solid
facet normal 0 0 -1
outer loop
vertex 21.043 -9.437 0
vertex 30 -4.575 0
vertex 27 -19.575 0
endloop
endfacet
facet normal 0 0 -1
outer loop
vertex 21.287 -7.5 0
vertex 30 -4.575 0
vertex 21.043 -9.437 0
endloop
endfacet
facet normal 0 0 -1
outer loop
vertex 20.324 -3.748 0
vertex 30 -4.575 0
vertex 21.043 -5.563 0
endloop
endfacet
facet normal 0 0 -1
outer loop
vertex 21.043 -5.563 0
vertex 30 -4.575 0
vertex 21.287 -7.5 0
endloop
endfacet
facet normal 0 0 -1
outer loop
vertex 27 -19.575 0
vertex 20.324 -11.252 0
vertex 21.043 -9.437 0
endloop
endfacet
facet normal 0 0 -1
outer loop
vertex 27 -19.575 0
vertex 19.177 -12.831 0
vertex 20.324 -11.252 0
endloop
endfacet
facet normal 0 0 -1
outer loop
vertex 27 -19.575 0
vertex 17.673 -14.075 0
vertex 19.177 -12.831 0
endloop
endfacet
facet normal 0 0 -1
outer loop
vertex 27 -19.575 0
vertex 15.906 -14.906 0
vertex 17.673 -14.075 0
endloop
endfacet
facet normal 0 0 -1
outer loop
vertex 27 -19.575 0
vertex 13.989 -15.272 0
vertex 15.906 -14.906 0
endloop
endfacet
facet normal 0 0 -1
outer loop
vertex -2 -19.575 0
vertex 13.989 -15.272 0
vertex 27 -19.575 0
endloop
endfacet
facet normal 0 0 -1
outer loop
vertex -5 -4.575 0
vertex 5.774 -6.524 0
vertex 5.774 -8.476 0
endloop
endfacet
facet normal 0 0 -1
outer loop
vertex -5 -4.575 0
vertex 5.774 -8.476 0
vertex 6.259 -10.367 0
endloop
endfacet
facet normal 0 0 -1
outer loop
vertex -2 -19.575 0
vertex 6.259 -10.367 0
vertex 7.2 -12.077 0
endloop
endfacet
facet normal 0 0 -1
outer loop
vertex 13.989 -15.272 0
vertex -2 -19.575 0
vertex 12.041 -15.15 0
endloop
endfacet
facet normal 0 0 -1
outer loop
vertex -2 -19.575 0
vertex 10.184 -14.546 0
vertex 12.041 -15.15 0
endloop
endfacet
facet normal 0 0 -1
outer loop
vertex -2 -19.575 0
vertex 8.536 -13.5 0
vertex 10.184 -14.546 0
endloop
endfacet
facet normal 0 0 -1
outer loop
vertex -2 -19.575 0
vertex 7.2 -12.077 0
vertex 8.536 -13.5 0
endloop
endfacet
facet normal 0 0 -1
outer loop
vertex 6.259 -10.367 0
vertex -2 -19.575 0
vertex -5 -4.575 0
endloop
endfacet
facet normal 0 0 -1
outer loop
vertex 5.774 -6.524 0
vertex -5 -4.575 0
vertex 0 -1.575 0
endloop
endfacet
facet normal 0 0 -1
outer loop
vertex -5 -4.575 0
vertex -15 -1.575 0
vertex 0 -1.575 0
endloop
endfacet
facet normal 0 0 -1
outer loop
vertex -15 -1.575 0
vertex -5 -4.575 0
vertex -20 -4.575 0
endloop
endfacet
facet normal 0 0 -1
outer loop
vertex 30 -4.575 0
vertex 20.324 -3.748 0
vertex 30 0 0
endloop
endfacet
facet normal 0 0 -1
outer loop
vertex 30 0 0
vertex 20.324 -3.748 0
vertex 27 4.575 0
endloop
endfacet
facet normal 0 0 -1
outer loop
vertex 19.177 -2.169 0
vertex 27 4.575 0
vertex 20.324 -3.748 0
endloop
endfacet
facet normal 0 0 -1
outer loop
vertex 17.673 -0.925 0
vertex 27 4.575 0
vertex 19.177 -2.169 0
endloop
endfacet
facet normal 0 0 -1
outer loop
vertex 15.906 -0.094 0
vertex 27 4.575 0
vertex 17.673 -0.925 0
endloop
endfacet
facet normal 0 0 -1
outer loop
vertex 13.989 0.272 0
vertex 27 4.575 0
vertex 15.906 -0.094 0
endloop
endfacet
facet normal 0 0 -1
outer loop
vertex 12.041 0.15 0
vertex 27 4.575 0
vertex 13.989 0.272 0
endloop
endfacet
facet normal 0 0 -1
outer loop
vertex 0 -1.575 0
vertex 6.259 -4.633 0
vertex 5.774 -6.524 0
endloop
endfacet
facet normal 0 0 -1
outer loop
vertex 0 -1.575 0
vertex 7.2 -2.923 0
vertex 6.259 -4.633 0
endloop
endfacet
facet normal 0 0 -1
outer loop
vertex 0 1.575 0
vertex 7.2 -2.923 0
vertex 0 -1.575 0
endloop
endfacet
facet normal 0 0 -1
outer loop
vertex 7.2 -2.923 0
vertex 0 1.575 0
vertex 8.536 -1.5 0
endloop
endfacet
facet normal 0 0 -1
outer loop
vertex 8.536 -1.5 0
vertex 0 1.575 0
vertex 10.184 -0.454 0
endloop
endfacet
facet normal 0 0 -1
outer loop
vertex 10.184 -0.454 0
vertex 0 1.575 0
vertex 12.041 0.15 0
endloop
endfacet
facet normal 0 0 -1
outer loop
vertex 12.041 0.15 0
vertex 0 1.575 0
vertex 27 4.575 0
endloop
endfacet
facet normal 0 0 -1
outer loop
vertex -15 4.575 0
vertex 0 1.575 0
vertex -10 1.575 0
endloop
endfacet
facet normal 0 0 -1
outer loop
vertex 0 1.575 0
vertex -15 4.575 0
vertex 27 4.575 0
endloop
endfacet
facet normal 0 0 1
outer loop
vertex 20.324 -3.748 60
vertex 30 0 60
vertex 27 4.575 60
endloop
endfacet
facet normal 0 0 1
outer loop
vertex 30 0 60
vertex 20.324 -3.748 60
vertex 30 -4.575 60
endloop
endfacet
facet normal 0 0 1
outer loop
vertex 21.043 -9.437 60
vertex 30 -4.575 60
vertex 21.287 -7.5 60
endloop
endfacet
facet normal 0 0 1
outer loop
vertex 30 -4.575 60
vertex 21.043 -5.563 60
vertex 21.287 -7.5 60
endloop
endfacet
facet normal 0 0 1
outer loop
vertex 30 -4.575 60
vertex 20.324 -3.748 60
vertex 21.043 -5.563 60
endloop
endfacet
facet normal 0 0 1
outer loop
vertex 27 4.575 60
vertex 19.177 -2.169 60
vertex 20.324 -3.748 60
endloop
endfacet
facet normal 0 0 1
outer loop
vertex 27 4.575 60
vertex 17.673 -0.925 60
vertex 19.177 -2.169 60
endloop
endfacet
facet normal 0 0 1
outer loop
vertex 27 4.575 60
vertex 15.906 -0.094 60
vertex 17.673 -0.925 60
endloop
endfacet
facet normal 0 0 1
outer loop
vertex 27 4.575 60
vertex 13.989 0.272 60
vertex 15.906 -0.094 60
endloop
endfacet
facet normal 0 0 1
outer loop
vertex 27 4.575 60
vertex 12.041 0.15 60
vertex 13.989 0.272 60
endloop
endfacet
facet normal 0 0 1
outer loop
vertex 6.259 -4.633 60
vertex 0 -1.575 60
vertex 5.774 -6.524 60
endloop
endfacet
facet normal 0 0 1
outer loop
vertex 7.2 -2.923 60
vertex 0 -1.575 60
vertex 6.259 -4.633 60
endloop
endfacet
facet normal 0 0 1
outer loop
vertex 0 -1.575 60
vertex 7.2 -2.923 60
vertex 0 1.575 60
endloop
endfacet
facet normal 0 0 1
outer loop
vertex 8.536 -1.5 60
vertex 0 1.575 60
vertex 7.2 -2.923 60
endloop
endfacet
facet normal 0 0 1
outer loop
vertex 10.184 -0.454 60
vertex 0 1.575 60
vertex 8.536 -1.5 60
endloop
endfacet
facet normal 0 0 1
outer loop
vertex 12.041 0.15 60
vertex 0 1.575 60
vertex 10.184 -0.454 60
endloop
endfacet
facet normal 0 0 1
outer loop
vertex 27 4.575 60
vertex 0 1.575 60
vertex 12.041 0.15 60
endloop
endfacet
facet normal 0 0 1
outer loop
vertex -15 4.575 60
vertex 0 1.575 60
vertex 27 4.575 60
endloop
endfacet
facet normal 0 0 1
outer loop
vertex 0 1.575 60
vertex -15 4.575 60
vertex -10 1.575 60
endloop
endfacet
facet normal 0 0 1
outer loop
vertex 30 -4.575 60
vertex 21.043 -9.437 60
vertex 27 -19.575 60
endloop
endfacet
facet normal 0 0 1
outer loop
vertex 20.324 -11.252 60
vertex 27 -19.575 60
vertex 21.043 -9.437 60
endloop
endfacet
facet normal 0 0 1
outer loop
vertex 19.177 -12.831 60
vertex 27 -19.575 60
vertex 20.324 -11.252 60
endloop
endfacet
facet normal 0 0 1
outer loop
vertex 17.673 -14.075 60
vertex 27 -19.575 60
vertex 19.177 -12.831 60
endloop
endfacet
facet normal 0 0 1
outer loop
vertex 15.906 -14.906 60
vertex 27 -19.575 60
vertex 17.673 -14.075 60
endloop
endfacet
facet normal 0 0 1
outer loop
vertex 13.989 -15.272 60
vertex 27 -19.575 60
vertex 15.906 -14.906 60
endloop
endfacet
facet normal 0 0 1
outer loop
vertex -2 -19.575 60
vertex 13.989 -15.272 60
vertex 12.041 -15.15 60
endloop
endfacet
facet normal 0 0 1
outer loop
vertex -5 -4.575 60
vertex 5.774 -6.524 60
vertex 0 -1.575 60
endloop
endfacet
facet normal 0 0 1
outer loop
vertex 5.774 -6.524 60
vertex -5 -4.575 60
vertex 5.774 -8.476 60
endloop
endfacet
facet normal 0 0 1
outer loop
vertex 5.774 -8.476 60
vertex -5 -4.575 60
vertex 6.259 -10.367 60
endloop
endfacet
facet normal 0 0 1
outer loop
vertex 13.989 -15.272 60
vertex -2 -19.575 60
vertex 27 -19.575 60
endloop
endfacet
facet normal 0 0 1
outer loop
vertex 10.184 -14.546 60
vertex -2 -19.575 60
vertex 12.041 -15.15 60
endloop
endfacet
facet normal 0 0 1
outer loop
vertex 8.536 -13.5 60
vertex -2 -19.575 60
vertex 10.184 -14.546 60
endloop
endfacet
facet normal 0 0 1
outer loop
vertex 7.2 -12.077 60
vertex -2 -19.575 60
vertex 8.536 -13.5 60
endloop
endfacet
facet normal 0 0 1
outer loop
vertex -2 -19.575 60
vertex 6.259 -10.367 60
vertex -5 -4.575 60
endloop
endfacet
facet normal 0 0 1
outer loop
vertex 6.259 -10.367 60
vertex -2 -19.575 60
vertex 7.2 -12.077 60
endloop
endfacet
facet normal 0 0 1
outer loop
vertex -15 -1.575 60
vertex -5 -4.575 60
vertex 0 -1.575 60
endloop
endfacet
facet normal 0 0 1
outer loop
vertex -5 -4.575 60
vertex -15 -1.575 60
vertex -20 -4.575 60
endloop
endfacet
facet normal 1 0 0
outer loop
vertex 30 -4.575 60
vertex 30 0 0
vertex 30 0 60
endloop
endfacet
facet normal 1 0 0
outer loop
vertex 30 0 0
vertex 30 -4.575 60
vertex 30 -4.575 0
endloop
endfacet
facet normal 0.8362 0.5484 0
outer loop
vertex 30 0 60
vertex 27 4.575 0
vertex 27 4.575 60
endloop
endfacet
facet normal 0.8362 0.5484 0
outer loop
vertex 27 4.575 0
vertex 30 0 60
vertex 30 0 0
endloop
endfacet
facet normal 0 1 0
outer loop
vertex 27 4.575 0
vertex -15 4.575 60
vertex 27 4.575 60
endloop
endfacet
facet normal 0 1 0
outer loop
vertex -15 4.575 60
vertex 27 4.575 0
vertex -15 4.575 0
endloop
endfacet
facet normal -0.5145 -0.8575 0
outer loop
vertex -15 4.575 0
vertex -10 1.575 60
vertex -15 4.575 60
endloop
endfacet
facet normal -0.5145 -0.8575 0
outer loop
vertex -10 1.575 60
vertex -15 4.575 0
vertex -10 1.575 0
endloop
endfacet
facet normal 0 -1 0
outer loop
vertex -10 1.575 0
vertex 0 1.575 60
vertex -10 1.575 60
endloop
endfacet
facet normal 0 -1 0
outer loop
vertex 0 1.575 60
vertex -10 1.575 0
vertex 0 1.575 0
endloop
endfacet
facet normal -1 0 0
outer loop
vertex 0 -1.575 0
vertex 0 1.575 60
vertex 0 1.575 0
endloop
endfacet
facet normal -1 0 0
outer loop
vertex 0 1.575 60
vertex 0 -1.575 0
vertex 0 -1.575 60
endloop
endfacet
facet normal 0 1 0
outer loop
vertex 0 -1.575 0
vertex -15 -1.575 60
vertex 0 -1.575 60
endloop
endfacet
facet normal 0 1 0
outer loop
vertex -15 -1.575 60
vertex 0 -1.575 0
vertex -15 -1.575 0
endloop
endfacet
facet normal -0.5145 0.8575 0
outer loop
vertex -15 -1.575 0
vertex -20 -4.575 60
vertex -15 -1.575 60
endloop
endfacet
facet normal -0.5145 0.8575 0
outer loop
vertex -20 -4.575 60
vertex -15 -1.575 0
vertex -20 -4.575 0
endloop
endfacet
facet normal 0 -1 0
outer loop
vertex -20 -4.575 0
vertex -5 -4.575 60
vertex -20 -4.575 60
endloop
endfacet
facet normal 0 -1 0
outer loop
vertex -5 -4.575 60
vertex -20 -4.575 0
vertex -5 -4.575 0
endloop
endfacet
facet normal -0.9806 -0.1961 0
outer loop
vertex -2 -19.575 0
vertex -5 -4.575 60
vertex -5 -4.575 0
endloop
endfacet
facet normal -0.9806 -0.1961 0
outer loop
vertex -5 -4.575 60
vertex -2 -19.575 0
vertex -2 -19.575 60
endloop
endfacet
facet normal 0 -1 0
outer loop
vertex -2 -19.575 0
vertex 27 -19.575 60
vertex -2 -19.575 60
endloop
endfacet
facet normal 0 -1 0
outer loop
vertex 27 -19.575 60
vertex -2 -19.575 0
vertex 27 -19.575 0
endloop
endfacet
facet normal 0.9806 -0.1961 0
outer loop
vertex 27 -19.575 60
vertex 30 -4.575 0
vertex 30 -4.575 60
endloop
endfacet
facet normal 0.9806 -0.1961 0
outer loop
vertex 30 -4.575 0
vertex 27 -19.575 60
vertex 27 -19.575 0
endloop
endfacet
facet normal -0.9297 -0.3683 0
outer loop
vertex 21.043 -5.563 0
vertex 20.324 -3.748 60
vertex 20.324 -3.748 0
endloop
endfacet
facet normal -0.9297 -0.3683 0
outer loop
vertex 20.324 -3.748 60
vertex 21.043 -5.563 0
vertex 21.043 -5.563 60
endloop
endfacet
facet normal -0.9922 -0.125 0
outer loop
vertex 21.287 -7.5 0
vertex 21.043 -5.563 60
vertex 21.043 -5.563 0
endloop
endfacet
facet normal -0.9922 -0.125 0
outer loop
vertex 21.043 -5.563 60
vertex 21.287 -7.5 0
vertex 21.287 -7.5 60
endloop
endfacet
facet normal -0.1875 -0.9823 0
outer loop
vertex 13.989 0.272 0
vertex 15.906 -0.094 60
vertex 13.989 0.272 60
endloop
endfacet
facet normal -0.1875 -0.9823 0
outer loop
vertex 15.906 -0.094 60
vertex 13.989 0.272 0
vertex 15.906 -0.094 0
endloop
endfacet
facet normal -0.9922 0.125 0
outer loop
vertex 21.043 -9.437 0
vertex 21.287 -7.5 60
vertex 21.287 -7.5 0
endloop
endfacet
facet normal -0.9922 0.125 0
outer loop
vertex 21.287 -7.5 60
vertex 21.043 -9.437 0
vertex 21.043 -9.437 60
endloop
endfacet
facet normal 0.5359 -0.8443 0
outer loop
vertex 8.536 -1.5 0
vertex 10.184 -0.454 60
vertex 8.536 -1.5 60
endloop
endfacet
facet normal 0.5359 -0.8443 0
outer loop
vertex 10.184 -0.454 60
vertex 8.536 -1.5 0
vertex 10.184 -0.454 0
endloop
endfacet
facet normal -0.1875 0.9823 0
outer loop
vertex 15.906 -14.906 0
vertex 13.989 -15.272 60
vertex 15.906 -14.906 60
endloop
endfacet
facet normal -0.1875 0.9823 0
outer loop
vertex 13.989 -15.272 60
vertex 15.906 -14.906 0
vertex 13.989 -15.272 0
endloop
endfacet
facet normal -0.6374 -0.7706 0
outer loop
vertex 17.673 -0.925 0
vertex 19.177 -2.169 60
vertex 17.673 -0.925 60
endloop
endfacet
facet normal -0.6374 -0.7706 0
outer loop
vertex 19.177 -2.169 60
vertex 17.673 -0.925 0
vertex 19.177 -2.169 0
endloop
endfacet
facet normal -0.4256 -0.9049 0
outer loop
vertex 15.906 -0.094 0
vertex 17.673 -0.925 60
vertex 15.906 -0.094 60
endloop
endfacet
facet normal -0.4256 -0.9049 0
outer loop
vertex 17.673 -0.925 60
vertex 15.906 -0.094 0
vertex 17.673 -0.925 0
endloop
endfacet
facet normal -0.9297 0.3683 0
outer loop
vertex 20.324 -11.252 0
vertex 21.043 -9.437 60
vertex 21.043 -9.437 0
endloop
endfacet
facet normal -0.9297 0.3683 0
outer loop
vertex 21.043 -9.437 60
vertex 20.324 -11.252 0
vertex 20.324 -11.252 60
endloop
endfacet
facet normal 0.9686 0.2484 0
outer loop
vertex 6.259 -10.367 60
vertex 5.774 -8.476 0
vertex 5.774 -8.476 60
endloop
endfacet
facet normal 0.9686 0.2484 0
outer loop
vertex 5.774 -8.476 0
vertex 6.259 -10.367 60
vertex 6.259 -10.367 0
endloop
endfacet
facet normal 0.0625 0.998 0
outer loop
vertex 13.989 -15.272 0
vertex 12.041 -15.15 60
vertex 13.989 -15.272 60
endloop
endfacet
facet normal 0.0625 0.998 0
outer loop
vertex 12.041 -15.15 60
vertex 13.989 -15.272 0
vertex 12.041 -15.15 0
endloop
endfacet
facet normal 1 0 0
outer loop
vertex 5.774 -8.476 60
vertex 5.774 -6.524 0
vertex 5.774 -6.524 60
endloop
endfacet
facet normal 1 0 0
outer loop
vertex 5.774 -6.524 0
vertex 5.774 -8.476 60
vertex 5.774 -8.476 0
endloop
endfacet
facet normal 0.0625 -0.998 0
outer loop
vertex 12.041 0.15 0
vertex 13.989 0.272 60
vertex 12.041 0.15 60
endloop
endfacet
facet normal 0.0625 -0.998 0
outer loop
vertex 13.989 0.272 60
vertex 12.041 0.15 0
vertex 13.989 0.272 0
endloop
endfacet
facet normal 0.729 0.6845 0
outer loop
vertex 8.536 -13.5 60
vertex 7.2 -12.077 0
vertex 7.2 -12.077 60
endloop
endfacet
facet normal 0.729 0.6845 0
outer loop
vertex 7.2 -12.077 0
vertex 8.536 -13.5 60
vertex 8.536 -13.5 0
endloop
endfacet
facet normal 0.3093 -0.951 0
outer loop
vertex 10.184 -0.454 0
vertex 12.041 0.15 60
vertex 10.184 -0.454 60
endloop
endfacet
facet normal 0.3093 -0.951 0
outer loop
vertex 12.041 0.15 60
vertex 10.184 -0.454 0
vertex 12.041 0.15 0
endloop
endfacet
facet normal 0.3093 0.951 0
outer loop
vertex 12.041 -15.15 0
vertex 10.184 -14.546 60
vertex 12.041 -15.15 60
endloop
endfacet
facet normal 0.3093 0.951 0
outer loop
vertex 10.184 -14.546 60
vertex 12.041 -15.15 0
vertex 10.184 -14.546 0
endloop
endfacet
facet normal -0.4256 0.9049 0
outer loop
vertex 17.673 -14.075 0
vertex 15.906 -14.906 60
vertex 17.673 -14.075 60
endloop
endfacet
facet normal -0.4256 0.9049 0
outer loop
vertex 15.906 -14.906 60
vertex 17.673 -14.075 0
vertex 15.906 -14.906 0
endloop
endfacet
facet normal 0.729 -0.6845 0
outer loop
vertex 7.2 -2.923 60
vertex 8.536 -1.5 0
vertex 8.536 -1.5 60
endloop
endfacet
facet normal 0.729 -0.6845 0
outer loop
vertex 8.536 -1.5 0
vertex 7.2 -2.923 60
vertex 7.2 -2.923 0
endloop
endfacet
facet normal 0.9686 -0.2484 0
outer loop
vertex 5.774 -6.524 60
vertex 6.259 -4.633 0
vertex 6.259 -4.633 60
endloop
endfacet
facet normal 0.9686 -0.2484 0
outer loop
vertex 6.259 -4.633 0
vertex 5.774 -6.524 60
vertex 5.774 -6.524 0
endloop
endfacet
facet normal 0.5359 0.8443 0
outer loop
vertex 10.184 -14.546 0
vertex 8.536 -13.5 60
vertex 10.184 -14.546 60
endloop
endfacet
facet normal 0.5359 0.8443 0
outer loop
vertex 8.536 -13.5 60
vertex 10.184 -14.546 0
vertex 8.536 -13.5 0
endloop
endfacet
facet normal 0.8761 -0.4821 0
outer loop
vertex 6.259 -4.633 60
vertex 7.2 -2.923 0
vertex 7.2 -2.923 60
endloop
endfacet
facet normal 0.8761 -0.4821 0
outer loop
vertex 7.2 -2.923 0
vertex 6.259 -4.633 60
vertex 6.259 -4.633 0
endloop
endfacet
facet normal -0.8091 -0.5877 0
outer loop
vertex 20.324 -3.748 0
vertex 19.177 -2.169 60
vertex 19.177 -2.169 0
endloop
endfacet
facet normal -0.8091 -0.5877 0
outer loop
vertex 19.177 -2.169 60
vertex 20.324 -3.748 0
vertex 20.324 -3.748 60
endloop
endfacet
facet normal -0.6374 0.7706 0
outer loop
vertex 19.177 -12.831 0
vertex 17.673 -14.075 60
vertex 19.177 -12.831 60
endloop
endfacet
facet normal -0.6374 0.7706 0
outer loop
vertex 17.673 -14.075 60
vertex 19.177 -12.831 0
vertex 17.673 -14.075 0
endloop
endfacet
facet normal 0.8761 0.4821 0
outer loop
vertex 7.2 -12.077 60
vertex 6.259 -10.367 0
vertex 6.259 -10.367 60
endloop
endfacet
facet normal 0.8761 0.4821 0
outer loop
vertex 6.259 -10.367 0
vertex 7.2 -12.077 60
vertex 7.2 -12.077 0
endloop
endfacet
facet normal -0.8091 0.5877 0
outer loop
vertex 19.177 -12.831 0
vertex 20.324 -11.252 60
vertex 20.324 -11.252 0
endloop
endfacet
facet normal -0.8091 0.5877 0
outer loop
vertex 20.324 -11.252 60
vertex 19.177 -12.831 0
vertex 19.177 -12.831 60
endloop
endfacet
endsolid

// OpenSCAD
/* Glass Plate Grabber and Support
 * By DrLex, 2016/12
 * Released under Creative Commons - Attribution - Share Alike license */

// preview[view:south east, tilt:top]

plateThickness = 3; //[1:0.1:10]
tolerance = 0.15; //[0:0.05:1]
bottomClampDepth = 15; //[5:25]
topClampDepth = 10; //[0:25]
footHeight = 15; //[0:1:40]
width = 60; //60; //[5:100]
hole = "yes"; //[yes,no]

/* [Hidden] */
halfTotalThickness = (plateThickness + tolerance)/2;
holeRadius = min(11, (footHeight+halfTotalThickness-1)/2);

difference() {
    linear_extrude(height=width) polygon(points=[
        [0, halfTotalThickness],
        [0, -halfTotalThickness],
        [-bottomClampDepth, -halfTotalThickness],
        [-bottomClampDepth-5, -halfTotalThickness-3],
        [-5, -halfTotalThickness-3],
        [-2, -footHeight-halfTotalThickness-3],
        [27, -footHeight-halfTotalThickness-3],
        [30, -halfTotalThickness-3],
        [30, 0],
        [27, halfTotalThickness+3],
        [-topClampDepth-5, halfTotalThickness+3],
        [-topClampDepth, halfTotalThickness]
    ]);
    
    if(hole == "yes") {
        translate([13.5, -footHeight/2, -1]) cylinder(h=width+2, r=holeRadius);
    }
}
